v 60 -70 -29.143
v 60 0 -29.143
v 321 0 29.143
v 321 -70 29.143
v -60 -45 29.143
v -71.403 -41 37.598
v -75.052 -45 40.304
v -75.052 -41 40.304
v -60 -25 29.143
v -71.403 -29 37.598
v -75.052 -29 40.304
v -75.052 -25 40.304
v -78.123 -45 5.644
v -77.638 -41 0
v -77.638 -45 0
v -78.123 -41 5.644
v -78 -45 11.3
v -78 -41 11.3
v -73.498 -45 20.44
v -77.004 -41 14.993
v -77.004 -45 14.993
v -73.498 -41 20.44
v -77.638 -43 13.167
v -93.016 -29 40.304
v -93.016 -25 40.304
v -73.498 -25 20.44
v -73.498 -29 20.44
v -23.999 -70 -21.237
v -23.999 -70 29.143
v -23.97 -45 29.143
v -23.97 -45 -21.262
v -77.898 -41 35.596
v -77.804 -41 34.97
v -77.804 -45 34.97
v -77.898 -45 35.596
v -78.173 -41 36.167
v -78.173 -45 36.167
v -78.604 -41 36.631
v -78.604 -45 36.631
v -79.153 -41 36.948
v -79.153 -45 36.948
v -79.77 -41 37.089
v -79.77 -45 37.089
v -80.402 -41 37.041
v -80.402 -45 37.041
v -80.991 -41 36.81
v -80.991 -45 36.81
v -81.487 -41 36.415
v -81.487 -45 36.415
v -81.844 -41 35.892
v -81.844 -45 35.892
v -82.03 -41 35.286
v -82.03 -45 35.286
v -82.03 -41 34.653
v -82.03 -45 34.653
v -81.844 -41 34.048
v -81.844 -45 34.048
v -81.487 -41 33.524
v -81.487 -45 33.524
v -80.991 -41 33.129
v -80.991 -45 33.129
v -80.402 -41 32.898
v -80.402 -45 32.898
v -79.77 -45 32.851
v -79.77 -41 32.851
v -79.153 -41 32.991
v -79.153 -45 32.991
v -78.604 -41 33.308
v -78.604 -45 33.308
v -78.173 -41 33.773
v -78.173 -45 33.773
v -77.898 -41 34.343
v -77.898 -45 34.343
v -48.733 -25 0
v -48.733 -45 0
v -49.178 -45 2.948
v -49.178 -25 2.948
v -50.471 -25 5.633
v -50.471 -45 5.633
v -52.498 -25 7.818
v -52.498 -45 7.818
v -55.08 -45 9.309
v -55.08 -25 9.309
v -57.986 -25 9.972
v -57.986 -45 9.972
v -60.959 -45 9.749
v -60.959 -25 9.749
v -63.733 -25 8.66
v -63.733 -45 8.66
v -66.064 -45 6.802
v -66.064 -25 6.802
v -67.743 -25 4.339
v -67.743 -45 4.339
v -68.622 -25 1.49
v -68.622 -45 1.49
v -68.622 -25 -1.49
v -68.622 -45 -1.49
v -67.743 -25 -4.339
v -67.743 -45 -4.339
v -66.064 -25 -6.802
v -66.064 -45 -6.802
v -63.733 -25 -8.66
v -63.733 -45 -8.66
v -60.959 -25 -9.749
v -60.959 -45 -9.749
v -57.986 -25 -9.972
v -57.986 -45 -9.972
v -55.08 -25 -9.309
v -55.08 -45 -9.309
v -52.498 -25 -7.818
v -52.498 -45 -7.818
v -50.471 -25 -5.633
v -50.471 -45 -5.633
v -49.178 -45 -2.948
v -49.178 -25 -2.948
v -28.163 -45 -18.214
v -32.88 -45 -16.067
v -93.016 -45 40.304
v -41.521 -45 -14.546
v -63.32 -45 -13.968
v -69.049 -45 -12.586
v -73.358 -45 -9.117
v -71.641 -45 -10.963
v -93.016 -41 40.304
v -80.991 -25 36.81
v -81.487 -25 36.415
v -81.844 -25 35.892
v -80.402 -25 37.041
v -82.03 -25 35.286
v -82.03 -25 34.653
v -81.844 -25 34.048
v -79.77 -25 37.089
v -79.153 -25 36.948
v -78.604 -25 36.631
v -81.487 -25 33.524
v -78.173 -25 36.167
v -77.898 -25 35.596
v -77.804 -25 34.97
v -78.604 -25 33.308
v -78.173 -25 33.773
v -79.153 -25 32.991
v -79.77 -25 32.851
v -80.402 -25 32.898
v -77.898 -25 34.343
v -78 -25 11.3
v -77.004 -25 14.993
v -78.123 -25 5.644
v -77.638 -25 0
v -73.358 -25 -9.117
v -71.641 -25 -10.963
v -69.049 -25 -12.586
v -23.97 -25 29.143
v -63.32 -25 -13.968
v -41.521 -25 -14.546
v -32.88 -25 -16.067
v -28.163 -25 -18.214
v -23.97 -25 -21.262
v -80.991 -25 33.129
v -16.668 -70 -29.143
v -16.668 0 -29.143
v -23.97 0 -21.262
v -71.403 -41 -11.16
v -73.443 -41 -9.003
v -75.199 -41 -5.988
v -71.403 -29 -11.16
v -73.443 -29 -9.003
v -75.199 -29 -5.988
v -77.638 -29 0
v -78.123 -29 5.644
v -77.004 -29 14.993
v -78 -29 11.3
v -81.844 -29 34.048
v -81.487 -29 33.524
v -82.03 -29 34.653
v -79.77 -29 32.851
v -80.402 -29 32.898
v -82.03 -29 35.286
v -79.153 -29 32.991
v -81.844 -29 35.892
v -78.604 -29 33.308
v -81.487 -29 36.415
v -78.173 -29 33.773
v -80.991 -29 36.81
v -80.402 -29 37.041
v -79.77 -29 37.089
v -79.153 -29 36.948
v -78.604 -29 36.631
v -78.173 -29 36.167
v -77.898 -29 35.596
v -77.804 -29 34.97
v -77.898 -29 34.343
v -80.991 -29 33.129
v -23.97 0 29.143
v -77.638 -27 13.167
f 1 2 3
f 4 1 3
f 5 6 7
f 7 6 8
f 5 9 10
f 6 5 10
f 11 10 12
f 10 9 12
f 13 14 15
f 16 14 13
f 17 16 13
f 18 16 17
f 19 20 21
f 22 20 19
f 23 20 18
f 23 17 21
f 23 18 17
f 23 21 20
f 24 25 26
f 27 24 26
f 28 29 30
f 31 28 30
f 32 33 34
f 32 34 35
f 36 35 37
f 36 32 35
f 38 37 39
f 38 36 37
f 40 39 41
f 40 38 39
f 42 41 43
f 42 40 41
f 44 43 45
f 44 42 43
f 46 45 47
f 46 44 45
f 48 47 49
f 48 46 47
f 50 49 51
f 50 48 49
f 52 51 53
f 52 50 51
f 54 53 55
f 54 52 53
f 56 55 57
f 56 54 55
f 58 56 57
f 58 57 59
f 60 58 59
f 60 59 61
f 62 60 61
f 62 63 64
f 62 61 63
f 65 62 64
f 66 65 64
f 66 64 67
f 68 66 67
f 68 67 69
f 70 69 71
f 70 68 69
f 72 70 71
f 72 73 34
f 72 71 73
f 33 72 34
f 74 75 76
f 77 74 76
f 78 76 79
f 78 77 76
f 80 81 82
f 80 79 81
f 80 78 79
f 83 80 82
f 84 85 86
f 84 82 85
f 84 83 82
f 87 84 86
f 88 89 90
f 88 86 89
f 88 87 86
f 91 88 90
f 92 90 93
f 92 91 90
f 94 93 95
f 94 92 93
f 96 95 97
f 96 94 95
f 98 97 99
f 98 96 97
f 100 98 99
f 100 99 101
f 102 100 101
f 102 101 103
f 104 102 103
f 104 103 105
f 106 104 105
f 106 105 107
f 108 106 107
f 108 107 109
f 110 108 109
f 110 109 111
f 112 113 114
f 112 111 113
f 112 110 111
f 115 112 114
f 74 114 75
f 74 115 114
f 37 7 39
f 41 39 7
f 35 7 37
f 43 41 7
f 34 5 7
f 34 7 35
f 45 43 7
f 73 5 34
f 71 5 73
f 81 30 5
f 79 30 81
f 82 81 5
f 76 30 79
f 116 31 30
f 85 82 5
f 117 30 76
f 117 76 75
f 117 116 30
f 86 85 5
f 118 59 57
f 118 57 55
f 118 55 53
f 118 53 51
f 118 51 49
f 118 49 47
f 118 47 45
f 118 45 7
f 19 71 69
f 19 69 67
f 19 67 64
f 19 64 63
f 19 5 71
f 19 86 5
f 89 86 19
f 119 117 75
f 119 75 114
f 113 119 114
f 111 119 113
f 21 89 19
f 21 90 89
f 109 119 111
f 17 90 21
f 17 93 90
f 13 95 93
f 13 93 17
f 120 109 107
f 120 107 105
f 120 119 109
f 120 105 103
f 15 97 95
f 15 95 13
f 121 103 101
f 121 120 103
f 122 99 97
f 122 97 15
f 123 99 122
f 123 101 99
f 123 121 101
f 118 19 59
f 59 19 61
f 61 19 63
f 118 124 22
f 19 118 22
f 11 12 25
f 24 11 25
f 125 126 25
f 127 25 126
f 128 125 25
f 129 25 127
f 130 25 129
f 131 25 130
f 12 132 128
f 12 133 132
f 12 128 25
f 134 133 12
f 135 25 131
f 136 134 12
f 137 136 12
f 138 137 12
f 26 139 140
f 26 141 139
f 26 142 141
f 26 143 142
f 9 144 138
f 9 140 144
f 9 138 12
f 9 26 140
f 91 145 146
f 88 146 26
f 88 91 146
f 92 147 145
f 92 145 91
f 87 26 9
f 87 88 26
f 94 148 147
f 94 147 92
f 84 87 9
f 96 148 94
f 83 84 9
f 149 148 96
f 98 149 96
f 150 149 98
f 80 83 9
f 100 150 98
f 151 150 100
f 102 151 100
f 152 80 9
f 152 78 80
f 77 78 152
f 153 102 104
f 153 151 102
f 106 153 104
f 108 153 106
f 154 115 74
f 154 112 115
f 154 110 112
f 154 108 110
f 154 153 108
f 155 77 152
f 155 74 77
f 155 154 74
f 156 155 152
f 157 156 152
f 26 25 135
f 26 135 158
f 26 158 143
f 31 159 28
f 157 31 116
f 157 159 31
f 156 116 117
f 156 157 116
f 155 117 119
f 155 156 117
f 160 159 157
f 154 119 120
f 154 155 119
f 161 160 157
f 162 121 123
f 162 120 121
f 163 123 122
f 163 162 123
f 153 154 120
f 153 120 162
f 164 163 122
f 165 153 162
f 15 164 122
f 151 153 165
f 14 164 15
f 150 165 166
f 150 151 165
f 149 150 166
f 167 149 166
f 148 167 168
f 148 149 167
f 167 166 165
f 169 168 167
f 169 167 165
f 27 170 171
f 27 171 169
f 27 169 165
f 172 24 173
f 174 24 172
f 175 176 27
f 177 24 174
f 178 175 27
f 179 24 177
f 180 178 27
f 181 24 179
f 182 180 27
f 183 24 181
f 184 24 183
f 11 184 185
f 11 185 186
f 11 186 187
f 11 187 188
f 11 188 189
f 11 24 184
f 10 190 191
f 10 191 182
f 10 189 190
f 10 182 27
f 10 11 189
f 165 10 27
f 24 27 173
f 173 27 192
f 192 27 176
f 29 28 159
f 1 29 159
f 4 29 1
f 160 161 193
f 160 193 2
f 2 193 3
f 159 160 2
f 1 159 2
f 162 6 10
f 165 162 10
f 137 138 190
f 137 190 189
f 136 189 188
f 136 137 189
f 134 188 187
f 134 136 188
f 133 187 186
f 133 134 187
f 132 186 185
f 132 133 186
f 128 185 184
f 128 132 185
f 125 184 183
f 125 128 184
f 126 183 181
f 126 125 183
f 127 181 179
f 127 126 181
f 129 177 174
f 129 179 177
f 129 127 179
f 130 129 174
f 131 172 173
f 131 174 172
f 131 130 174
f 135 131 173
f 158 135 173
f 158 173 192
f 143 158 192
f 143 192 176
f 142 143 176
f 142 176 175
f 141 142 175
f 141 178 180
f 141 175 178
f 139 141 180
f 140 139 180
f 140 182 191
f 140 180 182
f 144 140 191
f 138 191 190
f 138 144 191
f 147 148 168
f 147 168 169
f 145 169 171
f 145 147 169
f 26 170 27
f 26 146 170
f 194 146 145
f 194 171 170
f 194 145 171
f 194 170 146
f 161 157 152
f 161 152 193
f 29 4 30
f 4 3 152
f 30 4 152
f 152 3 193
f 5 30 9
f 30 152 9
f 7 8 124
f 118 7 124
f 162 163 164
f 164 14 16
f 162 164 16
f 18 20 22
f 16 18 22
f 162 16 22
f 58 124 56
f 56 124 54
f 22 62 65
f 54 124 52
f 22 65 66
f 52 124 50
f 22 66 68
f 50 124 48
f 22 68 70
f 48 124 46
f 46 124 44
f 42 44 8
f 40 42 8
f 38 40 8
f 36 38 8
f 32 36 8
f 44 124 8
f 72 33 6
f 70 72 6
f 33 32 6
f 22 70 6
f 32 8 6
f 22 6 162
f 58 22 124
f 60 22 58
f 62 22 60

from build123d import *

# Parameters (mm, degrees)
F0_R     = 10
F0_R_2   = 2.125
F1_DEPTH = 70
F2_W     = 23.7841829658
F2_H     = 12
F3_DEPTH = 50


with BuildPart() as f1:
    # F0 (on Front) → F1 (new body)
    with BuildSketch(Plane.XZ):
        with BuildLine():
            Line((60, 29.1429199278), (-60, 29.1429199278))
            Line((-60, 29.1429199278), (-75.0524420565, 40.3041392565))
            Line((-75.0524420565, 40.3041392565), (-93.0163642764, 40.3041392565))
            Line((-93.0163642764, 40.3041392565), (-73.4979985282, 20.4398736871))
            add(Edge.make_bspline(
                [(-77.6378661394, 0), (-78.1194158464, 4.7639785375), (-78.9848755826, 13.3259848022), (-75.1840223047, 18.2538969131), (-73.4979985282, 20.4398736871)],
                knots=[0, 0, 0, 0, 0.5564091394, 1, 1, 1, 1], degree=3))
            add(Edge.make_bspline(
                [(-16.6683998403, -29.1429199278), (-21.7410225995, -22.9682576809), (-32.5546179399, -10.6737549318), (-71.809926995, -17.7841787732), (-75.4187412252, -5.6402197394), (-77.6378661394, 0)],
                knots=[0, 0, 0, 0, 0.3300992596, 0.7296032213, 1, 1, 1, 1], degree=3))
            Line((-16.6683998403, -29.1429199278), (60, -29.1429199278))
            Line((60, -29.1429199278), (60, 29.1429199278))
        make_face()
        with Locations((-58.7333962321, 0)):
            Circle(F0_R, mode=Mode.SUBTRACT)
        with Locations((-79.928971827, 34.9695757031)):
            Circle(F0_R_2, mode=Mode.SUBTRACT)
        Polygon((321, 29.1429199278), (60, 29.1429199278), (60, -29.1429199278), align=None)
    extrude(amount=F1_DEPTH)

    # F2 (on Top) → F3 (cut, symmetric)
    with BuildSketch(Plane.XY):
        Polygon((-120.2781274915, 0), (-120.2781274915, -25), (-23.9695869386, -25), (-23.9695869386, 0), (-60, 0), align=None)
        Polygon((-23.9695869386, -45), (-122.6608380675, -45), (-122.6608380675, -72.7143883705), (-24.00202282, -72.7143883705), align=None)
        with Locations((-83.2946263254, -35)):
            Rectangle(F2_W, F2_H)
    extrude(amount=F3_DEPTH, both=True, mode=Mode.SUBTRACT)


solid = f1.part
